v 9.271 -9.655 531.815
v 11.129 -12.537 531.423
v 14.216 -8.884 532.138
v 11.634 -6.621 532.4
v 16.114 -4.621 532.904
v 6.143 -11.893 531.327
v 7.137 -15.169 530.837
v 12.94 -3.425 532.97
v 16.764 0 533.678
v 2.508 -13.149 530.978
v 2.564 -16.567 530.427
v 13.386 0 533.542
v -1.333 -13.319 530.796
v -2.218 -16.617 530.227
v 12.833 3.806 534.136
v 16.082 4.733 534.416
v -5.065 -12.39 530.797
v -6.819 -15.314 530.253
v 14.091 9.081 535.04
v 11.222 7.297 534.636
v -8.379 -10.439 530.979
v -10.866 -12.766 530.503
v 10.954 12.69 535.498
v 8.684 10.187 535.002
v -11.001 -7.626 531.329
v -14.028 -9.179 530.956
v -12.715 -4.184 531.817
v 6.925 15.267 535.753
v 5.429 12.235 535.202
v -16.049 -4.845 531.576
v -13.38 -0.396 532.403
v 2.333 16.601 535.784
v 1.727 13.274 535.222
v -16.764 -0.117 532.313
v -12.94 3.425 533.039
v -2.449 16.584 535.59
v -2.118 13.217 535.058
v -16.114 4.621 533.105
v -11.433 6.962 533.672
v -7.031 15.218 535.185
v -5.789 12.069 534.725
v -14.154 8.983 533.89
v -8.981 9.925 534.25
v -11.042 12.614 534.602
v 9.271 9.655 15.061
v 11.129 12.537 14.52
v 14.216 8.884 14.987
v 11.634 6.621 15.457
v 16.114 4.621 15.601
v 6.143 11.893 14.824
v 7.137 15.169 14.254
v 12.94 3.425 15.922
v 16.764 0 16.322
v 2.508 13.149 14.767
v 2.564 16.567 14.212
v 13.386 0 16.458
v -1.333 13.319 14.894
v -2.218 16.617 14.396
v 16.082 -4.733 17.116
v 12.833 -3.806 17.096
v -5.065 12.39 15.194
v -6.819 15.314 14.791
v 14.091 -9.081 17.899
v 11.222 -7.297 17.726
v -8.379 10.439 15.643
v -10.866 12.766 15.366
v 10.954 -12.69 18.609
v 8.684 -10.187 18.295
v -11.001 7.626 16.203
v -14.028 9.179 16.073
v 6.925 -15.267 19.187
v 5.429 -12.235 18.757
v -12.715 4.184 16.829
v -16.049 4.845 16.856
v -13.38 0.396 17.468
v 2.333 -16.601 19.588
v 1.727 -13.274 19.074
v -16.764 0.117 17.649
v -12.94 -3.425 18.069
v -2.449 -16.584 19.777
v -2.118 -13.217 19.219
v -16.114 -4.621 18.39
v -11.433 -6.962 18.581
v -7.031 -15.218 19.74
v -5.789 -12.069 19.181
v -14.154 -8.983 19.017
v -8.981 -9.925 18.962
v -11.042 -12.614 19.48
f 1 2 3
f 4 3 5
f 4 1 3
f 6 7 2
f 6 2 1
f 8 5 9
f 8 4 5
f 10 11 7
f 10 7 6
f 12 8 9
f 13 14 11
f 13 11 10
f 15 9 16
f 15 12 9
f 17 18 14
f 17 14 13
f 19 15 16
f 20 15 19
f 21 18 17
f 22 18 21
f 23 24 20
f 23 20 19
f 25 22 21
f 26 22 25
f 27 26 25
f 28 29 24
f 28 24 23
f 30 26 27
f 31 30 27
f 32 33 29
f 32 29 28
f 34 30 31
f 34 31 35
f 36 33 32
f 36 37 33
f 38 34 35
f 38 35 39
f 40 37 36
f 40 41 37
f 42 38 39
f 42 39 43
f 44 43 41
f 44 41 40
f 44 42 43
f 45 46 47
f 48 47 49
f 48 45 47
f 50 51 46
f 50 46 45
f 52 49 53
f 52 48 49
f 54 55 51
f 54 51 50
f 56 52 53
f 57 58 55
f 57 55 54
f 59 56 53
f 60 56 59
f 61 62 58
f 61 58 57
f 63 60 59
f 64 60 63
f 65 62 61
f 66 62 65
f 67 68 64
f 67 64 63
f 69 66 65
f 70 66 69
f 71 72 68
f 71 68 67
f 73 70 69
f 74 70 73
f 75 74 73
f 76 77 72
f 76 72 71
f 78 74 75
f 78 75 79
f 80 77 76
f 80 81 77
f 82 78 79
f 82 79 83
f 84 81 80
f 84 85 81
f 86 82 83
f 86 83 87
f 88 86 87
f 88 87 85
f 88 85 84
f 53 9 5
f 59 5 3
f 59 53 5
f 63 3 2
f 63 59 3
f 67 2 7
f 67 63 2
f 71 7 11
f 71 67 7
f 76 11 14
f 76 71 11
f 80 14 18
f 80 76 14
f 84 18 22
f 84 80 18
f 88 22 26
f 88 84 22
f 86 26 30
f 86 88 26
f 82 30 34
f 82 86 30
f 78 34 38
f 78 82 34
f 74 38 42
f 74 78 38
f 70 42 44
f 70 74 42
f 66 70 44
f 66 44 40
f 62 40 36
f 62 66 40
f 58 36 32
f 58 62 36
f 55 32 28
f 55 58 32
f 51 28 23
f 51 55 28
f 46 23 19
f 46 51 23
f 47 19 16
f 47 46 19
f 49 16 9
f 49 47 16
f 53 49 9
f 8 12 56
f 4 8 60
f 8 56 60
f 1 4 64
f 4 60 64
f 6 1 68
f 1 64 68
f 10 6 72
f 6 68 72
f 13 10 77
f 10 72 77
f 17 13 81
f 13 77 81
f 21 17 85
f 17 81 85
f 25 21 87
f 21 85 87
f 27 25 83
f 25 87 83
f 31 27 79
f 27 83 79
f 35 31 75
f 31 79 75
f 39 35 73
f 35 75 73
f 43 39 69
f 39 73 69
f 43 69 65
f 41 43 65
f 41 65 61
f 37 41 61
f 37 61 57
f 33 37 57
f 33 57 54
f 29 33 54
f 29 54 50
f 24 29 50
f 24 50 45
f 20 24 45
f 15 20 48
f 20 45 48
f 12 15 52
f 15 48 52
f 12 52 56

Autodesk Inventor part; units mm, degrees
ref_plane "Start plane" through (0, 0, 13.6102) normal (0, 0, 1) x (1, 0, 0)
ref_plane "End plane" through (0, 0, 536.3898) normal (0, 0, 1) x (1, 0, 0)
sketch "Sketch" plane through (0, 0, 0) normal (0, 0, 1) x (1, 0, 0)
  circle A0 centre (0, 0) radius 13.3858
  circle A1 centre (0, 0) radius 16.764
  dimension "d0" = 33.528
  dimension "d1" = 3.3782
extrude "Body" add sketch "Sketch" along normal up to surface (522.7796 mm away) from surface at 13.6102
sketch "Sketch3" plane through (0, 0, 0) normal (0, 0, 1) x (1, 0, 0)
  line L0 (0, 0) -> (10, 0)
ref_plane "Work Plane3" through (0, 0, 0) normal (0, -1, 0) x (1, 0, 0)
ref_plane "Work Plane4" through (0.6642, 2.6747, 533.4641) normal (-0.0396, -0.1596, 0.9864) x (0.9992, -0.0032, 0.0396)
split "Split1" plane through (0.6642, 2.6747, 533.4641) removes the side toward (-0.0396, -0.1596, 0.9864)
ref_plane "Work Plane5" through (0.6642, 2.6747, 16.5359) normal (-0.0396, -0.1596, -0.9864) x (0.8846, -0.4646, 0.0396)
split "Split2" plane through (0.6642, 2.6747, 16.5359) removes the side toward (-0.0396, -0.1596, -0.9864)
sketch "Sketch4" plane through (0, 0, 0) normal (0, -1, 0) x (1, 0, 0)
  line L0 (-2, 13.6102) -> (12, 13.6102) projected
  line L1 (-2, 536.3898) -> (12, 536.3898) projected
  dimension "d7" = 522.7796
equation "\"d0\" = G_H"
equation "\"d1\" = G_T"
equation "\"d2\" = G_L"
equation "\"G_H\" = 33.528"
equation "\"G_T\" = 3.3782"
equation "\"G_L\" = d7"
equation "\"G_OFFSET_START\" = -13.61022"
equation "\"G_OFFSET_END\" = -13.61022"
equation "\"d4\" = -G_OFFSET_START"
equation "\"d5\" = G_OFFSET_END + B_L"
equation "\"B_L\" = 550"
properties part number "ANSI - 1 x 0.133 - 20.582" material "Steel, Mild"
